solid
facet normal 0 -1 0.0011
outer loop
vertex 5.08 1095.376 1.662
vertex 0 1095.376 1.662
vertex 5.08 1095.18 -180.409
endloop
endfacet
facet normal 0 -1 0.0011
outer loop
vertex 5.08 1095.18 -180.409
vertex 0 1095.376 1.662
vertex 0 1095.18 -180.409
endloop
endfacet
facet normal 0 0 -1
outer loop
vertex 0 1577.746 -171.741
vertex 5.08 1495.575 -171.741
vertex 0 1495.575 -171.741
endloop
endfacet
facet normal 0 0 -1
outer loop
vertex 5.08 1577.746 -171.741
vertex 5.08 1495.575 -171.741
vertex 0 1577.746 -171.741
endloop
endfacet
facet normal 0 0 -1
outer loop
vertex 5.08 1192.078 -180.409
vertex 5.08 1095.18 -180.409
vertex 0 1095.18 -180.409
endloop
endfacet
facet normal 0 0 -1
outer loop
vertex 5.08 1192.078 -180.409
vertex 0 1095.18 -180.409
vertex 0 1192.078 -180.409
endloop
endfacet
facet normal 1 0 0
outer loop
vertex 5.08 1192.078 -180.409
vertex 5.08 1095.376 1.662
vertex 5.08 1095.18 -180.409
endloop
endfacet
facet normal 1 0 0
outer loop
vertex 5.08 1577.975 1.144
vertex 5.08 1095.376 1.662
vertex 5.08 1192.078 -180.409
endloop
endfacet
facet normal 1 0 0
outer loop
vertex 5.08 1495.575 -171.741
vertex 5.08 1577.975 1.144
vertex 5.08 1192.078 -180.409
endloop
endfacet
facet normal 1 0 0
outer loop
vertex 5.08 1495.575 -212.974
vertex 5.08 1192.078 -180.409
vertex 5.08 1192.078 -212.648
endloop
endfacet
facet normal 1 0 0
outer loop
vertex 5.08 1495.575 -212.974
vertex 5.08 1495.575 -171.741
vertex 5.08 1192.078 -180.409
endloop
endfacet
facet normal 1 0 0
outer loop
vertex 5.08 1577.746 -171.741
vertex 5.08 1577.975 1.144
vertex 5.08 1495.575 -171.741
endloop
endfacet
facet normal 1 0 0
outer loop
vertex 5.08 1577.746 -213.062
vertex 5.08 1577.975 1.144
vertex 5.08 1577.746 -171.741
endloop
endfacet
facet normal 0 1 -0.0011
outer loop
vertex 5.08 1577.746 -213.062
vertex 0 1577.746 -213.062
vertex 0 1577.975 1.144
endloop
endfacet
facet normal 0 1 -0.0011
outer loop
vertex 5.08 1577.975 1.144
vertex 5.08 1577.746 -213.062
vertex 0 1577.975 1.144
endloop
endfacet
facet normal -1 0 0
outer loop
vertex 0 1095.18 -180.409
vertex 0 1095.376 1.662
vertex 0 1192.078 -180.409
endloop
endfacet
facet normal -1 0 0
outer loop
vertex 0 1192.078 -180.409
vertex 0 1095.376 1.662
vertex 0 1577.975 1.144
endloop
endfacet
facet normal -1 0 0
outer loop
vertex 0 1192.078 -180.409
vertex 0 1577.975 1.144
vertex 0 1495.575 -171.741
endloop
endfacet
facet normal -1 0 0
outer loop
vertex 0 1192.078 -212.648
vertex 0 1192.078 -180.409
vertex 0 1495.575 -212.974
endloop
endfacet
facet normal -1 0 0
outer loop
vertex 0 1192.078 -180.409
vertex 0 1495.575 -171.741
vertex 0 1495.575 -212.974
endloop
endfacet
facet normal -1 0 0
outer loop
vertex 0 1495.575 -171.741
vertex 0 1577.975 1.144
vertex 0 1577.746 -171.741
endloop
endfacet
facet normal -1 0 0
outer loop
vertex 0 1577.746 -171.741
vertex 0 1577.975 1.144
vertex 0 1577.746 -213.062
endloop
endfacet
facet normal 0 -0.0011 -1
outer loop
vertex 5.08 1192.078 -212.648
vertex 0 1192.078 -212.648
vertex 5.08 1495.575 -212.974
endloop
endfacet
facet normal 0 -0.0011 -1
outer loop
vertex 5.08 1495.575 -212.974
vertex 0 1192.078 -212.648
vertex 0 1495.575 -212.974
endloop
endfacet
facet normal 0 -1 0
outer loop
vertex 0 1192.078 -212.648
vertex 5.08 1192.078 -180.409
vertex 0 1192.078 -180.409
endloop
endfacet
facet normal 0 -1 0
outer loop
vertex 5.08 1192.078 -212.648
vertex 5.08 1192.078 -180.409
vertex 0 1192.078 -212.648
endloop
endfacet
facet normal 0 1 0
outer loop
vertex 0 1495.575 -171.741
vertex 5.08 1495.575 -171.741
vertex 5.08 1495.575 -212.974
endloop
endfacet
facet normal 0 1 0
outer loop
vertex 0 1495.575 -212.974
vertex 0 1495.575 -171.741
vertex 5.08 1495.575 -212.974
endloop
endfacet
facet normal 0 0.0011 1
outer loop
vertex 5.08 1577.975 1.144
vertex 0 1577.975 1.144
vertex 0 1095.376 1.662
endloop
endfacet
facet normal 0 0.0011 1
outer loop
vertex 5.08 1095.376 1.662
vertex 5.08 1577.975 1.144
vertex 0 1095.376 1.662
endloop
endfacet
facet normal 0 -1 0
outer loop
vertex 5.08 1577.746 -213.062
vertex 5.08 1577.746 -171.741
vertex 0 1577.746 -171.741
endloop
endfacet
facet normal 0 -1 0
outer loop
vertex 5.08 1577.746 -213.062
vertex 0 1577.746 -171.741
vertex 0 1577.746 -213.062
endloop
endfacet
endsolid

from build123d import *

# Parameters (mm, degrees)
BOSS_EXTRUDE1_DEPTH = 5.08
SKETCH11_W          = 41.321018404
SKETCH11_H          = 82.171066474
SKETCH11_W_2        = 64.858701062
SKETCH11_H_2        = 131.277002868
CUT_EXTRUDE1_DEPTH  = 1593.302629235


with BuildPart() as part:
    # Sketch5 → Boss-Extrude1 (new body)
    with BuildSketch(Plane(origin=(0, 0, 0), x_dir=(0, 0, -1), z_dir=(1, 0, 0))):
        Polygon((-1.661660189, 1095.375698265), (212.544479643, 1095.145979446), (213.062028944, 1577.745701931), (-1.144110888, 1577.97542075), align=None)
    extrude(amount=BOSS_EXTRUDE1_DEPTH)

    # Sketch11 → Cut-Extrude1 (cut, through all)
    with BuildSketch(Plane(origin=(5.08, 0, 0), x_dir=(0, 0, -1), z_dir=(1, 0, 0))):
        with Locations((192.401519742, 1536.660168694)):
            Rectangle(SKETCH11_W, SKETCH11_H)
        with Locations((212.838086125, 1126.439608027)):
            Rectangle(SKETCH11_W_2, SKETCH11_H_2)
    extrude(amount=-CUT_EXTRUDE1_DEPTH, mode=Mode.SUBTRACT)


solid = part.part
